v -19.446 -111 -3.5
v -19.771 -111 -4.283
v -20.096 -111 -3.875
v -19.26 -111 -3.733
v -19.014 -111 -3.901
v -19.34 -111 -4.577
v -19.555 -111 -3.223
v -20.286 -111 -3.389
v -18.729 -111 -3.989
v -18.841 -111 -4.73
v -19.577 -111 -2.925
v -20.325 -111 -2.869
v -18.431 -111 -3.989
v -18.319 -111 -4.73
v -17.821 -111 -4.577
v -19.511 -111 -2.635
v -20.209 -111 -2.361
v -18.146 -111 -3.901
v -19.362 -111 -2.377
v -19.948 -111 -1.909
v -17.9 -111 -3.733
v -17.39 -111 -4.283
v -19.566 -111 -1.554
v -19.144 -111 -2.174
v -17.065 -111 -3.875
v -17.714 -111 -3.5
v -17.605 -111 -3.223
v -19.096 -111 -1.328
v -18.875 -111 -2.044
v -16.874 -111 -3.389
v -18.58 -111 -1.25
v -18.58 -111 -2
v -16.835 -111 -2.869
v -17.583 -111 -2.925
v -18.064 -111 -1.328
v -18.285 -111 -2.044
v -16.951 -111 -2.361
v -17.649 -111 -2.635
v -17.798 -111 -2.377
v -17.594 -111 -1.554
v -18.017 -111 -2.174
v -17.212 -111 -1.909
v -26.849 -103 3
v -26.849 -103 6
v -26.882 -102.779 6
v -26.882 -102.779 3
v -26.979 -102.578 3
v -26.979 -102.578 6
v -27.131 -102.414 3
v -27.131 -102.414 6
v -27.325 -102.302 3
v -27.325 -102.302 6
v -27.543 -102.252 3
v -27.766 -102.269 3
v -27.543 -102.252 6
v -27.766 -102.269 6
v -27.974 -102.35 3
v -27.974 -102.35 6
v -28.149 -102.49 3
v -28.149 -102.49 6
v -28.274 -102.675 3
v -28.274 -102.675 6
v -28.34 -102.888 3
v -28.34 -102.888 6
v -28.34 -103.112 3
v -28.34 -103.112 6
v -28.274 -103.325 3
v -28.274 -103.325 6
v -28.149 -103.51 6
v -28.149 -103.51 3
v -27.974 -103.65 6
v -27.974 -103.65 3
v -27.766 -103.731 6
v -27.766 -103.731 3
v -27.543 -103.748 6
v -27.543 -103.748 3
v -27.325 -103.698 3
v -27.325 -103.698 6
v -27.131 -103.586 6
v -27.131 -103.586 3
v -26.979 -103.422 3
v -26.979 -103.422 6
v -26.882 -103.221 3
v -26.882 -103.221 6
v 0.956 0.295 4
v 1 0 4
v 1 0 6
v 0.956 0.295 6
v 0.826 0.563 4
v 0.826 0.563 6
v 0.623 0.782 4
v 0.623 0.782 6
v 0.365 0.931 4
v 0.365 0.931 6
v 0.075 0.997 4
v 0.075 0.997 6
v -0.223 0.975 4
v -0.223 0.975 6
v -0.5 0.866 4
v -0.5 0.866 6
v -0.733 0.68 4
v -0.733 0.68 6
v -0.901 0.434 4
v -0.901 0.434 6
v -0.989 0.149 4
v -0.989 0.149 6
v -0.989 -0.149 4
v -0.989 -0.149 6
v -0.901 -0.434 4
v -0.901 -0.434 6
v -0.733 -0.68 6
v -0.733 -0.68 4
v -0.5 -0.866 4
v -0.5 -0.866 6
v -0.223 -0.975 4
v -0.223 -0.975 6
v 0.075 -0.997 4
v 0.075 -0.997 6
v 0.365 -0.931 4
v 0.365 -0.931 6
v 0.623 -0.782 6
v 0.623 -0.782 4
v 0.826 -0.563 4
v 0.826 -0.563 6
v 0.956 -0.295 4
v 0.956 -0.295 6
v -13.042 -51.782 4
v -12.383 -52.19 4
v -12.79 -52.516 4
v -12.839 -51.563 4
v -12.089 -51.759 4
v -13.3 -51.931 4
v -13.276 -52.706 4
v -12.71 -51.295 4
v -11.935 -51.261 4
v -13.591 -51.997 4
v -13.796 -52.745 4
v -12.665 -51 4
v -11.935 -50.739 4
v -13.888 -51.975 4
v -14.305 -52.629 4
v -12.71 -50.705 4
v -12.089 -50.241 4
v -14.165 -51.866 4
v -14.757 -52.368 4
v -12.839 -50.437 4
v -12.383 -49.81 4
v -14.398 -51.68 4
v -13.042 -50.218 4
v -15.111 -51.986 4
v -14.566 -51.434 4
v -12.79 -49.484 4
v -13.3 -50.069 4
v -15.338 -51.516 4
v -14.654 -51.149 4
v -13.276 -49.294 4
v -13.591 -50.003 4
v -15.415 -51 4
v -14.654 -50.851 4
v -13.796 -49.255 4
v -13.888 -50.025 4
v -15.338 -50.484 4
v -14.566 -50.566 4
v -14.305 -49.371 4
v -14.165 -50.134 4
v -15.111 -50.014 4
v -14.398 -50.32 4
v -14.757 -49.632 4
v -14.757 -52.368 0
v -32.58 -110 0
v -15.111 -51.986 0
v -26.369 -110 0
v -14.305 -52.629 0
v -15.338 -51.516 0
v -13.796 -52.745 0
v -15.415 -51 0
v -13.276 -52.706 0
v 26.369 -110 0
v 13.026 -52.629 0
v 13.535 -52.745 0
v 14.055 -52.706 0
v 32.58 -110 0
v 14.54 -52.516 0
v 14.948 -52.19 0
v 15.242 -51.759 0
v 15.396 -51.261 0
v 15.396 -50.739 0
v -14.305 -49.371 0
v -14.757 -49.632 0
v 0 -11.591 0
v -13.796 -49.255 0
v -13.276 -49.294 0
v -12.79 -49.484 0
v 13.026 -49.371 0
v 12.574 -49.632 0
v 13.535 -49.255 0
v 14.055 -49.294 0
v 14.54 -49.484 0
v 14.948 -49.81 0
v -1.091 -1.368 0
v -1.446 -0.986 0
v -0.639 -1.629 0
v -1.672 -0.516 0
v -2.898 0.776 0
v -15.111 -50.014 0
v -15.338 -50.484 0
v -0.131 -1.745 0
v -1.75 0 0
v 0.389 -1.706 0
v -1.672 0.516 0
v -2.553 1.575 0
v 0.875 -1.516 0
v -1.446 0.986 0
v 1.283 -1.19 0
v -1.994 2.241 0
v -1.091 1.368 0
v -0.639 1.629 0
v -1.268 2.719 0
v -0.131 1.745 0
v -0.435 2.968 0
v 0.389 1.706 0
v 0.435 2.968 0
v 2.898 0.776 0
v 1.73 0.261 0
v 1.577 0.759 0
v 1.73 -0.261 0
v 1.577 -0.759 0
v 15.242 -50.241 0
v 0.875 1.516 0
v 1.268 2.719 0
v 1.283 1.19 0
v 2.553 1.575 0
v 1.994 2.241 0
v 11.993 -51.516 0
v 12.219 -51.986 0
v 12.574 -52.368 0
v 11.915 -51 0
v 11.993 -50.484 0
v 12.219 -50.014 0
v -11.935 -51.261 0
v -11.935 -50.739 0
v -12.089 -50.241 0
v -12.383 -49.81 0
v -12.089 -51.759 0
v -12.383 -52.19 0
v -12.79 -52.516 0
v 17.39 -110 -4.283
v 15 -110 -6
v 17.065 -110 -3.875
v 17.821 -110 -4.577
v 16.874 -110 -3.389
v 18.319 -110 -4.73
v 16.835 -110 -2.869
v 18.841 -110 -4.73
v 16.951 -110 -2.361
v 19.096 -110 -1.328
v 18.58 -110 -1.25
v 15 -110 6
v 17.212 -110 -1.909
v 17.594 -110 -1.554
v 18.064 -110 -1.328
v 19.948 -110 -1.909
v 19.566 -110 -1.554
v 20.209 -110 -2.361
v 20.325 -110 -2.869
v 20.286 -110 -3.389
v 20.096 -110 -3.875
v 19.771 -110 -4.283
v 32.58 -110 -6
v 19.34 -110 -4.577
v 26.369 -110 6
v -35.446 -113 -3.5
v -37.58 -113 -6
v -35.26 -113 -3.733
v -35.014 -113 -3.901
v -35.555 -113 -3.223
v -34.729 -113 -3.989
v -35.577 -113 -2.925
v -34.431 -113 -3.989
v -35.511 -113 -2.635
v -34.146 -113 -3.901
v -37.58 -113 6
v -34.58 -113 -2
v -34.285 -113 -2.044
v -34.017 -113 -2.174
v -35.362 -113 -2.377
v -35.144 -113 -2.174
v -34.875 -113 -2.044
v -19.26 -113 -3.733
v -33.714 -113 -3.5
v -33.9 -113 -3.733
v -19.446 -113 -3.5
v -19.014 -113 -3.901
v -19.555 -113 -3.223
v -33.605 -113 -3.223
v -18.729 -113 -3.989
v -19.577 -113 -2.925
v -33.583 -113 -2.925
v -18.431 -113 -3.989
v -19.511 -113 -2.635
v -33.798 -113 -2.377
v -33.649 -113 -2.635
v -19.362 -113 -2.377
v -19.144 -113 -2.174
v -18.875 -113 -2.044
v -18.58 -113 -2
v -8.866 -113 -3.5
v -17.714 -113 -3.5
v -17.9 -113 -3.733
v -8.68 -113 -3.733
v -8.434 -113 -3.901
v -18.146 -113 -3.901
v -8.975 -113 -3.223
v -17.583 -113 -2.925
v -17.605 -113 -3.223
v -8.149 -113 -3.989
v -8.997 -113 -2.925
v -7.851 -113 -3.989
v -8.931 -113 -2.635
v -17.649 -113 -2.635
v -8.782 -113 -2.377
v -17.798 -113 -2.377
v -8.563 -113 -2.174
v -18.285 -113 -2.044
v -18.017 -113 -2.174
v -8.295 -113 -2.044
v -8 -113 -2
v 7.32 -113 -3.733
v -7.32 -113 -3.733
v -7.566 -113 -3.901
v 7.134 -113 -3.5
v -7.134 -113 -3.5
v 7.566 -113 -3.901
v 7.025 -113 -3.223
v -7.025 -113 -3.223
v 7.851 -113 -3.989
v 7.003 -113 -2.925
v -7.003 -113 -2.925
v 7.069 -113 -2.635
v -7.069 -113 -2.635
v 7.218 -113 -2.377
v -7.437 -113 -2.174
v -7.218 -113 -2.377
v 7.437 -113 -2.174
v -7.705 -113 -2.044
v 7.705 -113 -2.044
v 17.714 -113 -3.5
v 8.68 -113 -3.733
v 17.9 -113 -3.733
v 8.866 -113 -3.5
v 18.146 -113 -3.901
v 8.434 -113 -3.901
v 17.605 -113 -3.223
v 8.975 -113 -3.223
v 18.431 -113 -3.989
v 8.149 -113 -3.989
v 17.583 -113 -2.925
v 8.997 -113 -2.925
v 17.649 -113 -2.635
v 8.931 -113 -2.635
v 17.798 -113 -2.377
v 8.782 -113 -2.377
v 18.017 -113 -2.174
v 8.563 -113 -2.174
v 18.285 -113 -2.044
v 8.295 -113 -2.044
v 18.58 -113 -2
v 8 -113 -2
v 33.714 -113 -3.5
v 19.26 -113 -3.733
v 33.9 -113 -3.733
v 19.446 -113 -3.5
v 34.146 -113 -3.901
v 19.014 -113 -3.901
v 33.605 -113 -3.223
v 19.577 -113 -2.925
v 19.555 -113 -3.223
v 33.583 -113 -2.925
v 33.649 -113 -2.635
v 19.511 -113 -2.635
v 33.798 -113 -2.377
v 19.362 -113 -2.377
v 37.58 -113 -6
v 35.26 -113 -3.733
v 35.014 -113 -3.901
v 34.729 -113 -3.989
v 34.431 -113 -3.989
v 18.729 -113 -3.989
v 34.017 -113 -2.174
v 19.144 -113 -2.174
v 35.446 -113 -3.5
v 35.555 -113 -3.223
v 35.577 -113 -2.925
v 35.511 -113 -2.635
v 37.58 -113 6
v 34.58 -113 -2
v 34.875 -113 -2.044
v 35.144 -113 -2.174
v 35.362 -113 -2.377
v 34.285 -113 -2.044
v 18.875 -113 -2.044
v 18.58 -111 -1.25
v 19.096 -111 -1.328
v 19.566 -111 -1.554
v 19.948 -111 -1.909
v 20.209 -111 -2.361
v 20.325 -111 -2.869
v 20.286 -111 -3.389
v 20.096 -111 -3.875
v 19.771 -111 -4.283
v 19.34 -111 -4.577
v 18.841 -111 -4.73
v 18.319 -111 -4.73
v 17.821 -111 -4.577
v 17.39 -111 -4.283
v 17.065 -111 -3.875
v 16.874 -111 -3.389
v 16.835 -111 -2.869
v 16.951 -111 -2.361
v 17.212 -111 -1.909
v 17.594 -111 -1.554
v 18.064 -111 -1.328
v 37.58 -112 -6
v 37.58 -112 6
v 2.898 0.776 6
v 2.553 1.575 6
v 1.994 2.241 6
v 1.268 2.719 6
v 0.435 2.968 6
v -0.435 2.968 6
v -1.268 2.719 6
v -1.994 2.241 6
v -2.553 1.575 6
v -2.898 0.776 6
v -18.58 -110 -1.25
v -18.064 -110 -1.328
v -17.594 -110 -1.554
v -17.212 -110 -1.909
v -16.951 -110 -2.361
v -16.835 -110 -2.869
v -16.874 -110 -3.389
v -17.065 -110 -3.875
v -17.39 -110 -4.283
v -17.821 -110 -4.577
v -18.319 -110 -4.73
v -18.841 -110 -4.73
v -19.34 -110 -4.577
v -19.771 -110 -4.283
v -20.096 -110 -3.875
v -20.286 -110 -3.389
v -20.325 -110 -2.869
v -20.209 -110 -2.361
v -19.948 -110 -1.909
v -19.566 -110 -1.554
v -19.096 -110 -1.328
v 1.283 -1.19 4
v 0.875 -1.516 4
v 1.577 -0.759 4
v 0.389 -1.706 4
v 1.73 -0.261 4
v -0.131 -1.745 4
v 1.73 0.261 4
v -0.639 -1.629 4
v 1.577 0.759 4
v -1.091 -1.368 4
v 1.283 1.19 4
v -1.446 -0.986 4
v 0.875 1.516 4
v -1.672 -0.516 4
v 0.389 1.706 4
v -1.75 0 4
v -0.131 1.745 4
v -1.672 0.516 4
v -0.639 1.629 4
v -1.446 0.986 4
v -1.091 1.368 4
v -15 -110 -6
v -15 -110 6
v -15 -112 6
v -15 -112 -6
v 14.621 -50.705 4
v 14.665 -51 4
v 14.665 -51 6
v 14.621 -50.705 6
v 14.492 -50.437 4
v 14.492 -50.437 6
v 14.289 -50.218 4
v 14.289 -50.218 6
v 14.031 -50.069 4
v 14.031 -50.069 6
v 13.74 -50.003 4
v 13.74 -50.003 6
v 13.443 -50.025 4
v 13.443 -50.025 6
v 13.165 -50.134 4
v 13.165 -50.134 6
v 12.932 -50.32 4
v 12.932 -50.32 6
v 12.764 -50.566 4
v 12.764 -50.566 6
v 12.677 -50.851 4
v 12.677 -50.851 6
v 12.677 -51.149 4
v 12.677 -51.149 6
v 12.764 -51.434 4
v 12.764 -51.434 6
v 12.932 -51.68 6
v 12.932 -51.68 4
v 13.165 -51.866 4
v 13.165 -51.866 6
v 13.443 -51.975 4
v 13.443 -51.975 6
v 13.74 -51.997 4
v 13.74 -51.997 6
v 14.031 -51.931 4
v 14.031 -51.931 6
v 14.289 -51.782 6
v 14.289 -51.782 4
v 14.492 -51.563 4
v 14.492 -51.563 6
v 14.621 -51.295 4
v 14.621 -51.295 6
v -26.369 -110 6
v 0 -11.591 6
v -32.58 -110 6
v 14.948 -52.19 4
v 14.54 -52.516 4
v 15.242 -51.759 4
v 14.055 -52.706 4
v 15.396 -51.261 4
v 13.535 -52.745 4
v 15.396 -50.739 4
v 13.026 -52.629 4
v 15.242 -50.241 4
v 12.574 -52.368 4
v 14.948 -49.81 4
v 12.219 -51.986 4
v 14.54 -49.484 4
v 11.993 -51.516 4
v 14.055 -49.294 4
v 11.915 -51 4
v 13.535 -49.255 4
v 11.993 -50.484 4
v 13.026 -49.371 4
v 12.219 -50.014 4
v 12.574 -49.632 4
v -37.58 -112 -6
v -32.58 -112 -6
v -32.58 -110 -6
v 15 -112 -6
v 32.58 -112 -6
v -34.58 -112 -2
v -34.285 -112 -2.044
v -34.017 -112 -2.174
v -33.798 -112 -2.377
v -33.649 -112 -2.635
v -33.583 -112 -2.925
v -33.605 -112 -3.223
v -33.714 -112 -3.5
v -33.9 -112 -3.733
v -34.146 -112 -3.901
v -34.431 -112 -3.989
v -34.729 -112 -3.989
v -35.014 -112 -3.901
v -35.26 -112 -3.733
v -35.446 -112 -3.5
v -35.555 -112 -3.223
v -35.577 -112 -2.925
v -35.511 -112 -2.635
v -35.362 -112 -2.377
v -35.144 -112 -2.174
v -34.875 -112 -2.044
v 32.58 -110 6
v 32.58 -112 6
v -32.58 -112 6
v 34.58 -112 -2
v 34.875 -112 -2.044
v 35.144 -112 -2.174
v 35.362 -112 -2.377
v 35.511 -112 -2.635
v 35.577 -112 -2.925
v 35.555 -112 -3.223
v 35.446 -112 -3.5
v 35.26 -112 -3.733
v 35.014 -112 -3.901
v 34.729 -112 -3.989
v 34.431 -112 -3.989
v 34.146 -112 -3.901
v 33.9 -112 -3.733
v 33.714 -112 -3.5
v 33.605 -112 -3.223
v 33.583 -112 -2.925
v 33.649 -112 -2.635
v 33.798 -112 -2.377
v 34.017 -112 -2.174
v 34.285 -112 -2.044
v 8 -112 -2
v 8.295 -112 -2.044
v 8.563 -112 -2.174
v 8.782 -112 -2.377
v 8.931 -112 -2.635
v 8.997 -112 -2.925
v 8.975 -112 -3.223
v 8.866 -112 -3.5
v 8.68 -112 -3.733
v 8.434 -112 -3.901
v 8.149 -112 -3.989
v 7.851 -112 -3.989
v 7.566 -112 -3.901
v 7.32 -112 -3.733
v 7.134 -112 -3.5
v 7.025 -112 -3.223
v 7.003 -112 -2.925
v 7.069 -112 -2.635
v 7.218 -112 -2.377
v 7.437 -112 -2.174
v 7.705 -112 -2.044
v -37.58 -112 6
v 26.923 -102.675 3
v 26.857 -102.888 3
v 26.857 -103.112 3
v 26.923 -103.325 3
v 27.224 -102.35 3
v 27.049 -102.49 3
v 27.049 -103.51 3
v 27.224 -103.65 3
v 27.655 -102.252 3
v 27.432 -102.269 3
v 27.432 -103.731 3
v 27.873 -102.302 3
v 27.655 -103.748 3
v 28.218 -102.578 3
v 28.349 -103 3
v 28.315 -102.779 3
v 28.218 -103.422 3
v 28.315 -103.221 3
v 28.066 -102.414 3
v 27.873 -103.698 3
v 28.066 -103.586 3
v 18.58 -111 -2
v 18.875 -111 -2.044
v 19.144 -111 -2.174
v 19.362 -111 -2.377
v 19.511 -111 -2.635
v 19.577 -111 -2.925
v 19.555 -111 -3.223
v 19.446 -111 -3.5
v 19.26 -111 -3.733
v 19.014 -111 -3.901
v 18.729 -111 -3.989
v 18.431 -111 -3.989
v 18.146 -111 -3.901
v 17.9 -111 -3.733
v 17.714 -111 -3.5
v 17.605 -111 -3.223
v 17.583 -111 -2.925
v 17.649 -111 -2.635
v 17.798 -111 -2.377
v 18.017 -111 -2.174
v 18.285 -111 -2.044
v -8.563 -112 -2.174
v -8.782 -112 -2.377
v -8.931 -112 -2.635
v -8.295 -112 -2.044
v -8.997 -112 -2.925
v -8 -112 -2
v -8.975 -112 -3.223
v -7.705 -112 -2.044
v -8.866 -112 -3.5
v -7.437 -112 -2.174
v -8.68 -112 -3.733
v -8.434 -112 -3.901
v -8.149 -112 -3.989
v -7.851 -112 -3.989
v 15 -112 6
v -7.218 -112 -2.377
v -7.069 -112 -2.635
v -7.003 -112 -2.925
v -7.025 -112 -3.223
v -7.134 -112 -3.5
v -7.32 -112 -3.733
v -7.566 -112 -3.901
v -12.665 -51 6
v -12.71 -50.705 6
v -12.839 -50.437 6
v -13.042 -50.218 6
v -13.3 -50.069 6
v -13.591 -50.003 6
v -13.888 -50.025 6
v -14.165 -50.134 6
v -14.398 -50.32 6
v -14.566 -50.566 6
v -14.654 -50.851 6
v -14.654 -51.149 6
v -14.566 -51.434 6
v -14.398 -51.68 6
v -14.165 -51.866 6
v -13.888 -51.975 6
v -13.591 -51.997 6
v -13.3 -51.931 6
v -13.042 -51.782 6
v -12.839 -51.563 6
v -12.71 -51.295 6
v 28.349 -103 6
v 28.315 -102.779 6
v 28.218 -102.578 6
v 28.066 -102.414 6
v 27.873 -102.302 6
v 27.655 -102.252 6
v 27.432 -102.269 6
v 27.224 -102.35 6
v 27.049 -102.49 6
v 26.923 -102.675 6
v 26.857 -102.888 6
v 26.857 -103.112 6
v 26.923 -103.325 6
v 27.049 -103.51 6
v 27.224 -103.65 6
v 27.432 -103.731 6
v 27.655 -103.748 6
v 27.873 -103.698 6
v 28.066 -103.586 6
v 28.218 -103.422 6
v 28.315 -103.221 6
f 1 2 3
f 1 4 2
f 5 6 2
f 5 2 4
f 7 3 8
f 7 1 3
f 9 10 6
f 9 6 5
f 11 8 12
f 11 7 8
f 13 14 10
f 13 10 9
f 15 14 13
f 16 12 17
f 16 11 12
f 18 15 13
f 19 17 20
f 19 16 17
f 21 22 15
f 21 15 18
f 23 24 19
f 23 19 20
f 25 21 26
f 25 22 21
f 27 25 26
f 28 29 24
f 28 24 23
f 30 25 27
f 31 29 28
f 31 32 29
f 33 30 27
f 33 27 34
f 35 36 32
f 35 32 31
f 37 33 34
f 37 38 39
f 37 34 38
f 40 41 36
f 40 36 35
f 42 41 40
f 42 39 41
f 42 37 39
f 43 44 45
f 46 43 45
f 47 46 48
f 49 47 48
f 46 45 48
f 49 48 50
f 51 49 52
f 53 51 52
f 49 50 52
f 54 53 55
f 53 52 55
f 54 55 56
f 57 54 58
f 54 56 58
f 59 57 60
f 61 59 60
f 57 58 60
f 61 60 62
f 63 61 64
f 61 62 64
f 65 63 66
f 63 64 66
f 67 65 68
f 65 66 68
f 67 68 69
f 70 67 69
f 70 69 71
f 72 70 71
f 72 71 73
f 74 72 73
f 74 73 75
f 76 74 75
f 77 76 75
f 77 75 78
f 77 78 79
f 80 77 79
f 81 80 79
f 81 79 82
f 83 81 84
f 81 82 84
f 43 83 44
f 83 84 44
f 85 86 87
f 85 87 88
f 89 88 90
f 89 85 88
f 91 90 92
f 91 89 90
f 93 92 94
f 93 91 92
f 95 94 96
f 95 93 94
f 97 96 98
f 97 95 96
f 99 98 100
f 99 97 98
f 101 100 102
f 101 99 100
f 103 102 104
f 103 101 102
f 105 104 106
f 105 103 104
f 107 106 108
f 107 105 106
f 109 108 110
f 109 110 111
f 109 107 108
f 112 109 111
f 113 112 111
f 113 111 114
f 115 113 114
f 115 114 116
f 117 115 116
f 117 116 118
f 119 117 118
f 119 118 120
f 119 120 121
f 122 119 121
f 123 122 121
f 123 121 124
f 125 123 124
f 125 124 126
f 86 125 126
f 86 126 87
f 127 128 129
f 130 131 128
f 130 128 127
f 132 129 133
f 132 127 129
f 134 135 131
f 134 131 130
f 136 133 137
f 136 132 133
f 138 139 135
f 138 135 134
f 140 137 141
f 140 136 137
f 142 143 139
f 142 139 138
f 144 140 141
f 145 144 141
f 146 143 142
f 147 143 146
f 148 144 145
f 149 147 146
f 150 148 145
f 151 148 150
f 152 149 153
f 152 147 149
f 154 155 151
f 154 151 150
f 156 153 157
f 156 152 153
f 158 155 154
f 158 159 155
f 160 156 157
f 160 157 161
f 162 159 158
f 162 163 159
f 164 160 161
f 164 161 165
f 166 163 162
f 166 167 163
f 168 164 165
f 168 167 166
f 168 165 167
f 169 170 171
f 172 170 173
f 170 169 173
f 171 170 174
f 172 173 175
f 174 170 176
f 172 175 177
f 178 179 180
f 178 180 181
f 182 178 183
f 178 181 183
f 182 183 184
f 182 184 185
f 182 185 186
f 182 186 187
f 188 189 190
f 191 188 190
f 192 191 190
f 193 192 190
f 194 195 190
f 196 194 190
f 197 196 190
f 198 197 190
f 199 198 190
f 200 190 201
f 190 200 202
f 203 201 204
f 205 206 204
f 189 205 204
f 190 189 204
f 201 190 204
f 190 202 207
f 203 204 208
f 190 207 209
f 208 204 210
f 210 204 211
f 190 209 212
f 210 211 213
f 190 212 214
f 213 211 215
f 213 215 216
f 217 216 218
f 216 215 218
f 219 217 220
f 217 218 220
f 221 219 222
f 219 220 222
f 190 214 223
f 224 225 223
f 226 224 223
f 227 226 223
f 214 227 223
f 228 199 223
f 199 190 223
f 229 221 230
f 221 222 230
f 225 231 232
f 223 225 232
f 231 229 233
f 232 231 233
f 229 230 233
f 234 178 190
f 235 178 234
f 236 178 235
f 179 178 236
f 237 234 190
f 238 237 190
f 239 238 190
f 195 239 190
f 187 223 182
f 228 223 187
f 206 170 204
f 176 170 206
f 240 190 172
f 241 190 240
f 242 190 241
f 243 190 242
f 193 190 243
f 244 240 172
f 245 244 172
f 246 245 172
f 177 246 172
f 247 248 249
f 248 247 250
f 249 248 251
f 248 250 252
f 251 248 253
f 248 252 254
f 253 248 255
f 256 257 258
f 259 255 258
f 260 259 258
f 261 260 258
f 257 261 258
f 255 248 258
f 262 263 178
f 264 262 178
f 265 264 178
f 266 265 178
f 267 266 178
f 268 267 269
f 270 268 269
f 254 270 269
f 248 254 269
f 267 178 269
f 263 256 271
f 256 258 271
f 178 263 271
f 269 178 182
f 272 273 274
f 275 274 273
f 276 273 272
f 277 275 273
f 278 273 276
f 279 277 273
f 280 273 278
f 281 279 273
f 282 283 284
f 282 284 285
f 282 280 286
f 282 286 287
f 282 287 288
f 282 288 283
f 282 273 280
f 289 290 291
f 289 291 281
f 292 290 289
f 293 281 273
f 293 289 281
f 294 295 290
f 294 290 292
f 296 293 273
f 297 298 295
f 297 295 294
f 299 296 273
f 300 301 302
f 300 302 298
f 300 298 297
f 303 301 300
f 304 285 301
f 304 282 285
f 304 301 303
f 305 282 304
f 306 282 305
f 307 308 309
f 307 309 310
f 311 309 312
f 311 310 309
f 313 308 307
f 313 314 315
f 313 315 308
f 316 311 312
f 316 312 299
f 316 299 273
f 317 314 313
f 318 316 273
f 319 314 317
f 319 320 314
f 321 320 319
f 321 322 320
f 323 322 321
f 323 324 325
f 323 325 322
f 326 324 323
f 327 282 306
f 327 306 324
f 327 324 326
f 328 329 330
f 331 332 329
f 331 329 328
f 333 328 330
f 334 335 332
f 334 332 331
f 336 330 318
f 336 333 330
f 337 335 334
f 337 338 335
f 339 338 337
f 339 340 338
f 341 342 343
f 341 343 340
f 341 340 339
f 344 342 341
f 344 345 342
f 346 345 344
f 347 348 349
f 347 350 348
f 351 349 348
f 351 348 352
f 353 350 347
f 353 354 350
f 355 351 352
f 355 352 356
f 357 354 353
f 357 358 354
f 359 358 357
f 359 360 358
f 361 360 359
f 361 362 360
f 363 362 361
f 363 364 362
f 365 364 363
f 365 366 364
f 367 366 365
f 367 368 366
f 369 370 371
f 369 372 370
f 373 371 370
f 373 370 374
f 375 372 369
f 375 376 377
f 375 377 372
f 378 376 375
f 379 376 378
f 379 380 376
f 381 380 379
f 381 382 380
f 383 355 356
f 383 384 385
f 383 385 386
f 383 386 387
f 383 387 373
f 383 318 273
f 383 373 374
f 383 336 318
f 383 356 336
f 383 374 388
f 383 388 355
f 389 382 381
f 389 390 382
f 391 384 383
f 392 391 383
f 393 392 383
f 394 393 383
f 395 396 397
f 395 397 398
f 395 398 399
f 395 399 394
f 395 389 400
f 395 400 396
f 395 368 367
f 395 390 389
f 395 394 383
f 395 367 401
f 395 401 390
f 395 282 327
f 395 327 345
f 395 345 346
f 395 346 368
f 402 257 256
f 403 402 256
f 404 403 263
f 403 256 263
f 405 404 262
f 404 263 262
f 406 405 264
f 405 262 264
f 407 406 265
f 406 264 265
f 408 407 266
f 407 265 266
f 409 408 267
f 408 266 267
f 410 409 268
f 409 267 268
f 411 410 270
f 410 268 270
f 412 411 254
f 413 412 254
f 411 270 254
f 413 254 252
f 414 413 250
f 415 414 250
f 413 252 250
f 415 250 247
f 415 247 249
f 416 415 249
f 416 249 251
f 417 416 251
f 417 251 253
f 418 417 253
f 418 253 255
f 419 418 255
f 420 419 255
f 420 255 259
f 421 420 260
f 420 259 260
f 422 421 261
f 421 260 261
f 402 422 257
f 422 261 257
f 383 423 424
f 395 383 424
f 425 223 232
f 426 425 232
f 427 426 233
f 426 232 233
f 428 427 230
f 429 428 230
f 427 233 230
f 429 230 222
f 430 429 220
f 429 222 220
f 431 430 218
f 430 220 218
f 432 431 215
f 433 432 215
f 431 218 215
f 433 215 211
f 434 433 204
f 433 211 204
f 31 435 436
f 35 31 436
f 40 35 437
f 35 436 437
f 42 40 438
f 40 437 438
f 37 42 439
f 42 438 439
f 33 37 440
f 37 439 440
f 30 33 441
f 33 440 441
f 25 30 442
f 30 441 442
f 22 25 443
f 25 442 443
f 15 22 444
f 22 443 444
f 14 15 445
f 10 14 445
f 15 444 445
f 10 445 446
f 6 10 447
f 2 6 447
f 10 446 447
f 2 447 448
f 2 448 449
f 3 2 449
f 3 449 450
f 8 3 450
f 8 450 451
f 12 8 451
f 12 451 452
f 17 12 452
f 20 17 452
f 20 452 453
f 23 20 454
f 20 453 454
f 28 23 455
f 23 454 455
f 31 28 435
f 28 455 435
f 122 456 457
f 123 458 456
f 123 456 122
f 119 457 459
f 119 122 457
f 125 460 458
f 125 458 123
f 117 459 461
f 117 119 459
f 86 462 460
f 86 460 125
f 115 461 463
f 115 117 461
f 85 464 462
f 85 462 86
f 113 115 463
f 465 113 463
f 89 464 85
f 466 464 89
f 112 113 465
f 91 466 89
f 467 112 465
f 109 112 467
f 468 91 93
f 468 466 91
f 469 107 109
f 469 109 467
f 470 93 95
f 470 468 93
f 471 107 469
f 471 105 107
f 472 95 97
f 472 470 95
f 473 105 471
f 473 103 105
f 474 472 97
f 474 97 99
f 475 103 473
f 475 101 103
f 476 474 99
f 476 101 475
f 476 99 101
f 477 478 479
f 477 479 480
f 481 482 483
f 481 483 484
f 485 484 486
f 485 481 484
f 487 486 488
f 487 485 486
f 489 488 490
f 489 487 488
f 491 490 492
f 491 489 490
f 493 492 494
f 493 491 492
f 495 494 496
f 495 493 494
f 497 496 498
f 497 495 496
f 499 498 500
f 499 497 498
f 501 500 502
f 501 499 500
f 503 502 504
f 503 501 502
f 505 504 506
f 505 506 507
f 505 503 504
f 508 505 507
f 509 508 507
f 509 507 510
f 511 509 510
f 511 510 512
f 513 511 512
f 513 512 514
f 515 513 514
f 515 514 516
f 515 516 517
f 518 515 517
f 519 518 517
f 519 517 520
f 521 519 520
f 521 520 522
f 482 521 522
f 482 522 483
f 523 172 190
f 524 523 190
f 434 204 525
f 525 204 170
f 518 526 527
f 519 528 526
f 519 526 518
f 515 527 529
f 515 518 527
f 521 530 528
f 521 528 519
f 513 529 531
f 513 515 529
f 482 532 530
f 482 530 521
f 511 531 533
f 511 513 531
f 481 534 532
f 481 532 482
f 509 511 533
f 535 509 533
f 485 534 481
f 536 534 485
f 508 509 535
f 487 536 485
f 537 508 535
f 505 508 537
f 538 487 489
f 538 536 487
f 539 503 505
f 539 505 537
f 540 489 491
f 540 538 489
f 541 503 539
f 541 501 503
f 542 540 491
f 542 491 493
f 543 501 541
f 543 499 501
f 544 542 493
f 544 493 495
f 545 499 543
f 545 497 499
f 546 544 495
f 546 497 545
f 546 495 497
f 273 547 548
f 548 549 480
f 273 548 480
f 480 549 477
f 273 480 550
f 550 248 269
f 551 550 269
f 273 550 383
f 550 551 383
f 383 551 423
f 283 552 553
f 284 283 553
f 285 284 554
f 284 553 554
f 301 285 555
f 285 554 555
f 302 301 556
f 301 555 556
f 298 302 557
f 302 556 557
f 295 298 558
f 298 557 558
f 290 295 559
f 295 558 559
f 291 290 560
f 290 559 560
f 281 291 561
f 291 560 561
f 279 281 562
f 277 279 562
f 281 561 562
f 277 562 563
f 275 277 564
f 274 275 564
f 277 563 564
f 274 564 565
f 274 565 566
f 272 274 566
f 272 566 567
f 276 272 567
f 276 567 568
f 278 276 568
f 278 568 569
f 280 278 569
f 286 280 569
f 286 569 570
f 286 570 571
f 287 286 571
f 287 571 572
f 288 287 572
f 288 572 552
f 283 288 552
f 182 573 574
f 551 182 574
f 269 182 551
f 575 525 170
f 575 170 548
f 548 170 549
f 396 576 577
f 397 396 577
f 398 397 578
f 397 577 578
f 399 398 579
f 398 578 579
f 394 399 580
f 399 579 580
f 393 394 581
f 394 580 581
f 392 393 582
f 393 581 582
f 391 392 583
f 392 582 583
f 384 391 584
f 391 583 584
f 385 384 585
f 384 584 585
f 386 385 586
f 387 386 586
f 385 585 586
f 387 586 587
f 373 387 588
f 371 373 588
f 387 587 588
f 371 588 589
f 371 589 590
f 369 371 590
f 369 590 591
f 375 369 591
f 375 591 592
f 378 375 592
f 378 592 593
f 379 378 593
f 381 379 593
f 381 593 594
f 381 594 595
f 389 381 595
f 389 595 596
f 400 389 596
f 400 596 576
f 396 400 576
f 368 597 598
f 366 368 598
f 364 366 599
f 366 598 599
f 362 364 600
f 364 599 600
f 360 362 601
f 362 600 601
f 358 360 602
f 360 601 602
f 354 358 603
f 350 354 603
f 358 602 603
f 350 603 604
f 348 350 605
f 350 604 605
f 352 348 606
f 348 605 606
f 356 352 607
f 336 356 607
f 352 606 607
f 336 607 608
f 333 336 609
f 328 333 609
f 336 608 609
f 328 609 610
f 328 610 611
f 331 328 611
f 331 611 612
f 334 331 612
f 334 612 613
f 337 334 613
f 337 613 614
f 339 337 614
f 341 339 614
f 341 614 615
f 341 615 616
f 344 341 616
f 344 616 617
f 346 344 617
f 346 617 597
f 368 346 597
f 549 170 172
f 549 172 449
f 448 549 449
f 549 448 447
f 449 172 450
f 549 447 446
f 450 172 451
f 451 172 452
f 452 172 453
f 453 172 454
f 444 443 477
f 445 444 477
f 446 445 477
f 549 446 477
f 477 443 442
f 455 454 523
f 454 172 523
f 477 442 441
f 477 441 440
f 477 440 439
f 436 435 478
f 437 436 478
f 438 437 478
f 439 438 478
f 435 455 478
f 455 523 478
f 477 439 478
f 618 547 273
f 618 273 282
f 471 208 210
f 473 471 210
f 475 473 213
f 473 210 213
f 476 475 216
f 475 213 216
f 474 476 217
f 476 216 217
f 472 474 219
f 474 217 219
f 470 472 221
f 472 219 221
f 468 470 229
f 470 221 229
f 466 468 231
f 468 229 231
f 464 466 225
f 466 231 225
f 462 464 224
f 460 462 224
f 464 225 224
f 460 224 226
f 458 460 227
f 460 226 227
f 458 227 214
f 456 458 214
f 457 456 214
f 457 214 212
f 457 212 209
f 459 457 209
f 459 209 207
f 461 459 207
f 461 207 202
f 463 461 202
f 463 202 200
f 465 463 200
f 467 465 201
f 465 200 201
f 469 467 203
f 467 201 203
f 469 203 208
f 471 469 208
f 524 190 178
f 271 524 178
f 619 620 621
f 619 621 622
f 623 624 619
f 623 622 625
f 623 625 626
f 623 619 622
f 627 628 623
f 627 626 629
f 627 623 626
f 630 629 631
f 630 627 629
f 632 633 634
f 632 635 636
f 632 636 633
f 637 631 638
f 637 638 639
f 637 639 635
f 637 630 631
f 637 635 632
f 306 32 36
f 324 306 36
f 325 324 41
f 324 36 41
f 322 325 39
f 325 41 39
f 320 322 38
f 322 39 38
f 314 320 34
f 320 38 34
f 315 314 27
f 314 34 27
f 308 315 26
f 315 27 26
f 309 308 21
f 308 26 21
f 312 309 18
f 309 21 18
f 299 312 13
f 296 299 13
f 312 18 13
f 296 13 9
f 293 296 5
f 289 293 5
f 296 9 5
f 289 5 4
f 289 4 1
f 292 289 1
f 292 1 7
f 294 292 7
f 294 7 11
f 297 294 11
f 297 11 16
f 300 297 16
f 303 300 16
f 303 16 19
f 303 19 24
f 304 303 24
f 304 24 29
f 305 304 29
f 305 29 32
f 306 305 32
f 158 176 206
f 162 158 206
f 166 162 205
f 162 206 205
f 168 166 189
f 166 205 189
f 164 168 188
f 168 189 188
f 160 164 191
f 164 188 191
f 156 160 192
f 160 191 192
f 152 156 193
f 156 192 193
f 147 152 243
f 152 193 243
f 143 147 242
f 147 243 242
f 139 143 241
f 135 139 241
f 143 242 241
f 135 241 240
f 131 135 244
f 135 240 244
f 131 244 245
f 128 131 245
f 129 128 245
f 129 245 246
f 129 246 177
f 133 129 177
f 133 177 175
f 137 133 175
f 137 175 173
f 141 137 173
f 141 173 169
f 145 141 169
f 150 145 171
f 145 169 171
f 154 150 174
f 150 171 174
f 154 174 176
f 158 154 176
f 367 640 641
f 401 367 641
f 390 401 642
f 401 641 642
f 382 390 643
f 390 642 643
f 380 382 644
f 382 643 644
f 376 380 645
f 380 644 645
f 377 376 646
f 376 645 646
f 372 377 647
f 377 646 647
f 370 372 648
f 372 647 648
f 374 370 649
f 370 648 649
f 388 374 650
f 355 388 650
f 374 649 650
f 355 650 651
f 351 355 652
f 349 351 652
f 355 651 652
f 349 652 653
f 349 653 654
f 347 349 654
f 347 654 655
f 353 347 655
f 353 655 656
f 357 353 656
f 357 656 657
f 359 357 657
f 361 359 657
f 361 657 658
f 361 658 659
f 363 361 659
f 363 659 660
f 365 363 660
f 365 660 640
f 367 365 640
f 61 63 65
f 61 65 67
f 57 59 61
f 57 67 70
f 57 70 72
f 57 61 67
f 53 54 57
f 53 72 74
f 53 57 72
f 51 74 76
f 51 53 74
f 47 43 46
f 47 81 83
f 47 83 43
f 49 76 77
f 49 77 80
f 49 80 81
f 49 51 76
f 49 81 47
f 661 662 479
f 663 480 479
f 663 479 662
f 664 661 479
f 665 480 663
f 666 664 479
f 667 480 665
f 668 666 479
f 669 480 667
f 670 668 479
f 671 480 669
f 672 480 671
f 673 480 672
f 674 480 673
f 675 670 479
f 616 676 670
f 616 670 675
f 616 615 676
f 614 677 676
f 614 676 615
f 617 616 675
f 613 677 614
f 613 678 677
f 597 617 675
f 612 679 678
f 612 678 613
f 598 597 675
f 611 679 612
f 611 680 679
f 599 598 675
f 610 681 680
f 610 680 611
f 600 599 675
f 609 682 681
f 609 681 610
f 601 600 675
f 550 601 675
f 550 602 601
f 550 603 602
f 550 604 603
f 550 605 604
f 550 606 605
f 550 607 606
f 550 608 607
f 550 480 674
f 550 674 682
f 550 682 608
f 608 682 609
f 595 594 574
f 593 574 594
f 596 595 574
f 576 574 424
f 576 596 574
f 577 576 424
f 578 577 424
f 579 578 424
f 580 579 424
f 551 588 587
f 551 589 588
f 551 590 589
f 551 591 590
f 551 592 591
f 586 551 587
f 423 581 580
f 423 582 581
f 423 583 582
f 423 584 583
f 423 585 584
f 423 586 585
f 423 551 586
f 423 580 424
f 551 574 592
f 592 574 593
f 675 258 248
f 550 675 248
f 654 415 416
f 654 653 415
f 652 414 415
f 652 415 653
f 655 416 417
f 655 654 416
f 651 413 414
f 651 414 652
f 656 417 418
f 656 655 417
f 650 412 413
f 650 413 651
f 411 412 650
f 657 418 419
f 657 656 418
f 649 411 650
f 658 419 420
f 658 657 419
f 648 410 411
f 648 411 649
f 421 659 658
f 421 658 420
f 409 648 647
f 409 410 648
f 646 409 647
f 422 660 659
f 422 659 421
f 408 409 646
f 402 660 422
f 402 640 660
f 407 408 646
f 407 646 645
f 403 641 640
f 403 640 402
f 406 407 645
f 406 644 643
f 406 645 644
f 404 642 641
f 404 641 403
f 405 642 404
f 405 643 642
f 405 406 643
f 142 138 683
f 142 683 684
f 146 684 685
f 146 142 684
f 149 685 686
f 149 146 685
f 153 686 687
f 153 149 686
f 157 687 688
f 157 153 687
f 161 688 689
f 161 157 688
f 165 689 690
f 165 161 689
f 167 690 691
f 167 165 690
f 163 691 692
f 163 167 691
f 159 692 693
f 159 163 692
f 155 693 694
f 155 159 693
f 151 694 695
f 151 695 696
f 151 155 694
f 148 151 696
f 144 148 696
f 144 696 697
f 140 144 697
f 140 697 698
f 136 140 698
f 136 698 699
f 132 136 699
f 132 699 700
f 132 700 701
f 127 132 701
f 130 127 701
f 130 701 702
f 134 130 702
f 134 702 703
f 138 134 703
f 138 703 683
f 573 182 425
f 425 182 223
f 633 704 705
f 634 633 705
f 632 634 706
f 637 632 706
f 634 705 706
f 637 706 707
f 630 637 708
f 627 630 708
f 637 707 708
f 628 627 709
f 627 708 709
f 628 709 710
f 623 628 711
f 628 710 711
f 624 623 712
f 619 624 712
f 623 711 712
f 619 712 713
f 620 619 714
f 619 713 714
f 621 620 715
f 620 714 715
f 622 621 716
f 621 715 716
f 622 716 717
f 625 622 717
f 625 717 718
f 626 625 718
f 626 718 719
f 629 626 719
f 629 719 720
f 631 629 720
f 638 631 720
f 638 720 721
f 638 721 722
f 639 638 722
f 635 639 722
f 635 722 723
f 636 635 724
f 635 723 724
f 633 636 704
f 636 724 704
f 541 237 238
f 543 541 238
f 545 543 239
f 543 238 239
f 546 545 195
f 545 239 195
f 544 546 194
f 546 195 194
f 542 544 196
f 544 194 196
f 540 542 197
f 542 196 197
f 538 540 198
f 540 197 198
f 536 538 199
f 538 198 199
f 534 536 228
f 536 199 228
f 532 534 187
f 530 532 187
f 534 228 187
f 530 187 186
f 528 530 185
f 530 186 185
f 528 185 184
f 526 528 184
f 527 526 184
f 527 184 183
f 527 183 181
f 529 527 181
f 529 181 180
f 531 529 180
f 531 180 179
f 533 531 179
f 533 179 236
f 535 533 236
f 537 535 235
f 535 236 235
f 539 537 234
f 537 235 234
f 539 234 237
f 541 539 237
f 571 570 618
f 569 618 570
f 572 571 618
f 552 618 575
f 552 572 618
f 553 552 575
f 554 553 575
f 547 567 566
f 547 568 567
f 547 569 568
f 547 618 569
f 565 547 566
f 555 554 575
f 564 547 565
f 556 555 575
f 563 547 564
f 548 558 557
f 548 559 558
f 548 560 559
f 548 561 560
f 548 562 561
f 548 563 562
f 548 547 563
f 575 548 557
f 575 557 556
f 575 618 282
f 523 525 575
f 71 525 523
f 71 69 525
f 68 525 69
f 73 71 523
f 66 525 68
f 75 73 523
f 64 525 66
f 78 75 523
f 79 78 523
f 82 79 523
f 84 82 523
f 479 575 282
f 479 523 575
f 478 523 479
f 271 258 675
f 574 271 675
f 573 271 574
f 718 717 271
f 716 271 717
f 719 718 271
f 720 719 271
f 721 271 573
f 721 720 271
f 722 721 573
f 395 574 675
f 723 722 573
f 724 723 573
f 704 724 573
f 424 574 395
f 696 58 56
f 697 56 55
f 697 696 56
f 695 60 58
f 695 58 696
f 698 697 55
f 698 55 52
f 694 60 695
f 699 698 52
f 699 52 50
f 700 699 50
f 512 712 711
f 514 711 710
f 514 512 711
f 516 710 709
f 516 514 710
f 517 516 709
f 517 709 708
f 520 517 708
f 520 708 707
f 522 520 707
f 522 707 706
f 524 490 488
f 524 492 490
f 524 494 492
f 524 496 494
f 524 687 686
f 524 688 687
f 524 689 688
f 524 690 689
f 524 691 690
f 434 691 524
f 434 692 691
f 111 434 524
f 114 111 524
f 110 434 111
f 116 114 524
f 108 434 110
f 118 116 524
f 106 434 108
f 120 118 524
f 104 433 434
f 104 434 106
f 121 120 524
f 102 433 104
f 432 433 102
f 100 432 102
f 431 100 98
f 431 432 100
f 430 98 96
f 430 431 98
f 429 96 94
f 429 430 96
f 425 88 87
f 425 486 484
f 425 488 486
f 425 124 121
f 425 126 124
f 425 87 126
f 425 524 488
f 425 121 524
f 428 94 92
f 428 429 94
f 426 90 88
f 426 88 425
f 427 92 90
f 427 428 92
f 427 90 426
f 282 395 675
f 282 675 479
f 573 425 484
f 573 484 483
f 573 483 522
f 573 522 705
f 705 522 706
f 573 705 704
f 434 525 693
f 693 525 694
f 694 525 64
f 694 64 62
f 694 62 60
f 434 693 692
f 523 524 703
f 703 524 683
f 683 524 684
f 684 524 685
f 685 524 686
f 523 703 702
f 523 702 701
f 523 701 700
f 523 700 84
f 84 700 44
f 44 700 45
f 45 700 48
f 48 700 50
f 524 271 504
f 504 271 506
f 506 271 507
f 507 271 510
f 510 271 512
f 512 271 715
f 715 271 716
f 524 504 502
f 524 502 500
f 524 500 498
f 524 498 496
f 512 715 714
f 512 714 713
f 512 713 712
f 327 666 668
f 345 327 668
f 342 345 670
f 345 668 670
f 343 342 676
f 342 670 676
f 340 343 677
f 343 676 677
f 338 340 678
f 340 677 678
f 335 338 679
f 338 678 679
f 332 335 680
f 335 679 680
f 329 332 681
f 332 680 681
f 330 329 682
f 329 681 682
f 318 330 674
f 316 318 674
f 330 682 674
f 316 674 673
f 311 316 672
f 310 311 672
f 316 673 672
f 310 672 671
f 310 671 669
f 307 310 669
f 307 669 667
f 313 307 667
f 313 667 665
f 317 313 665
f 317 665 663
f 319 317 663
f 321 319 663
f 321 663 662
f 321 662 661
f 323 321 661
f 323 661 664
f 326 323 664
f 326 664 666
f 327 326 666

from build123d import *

# Parameters (mm, degrees)
SKETCH_1_R          = 1
EXTRUDE_1_DEPTH     = 6
SKETCH_2_R          = 1.75
CUT_EXTRUDE_1_DEPTH = 4
SKETCH_3_W          = 75.160479418
SKETCH_3_H          = 12
EXTRUDE_2_DEPTH     = 3
SKETCH_4_R          = 0.75
CUT_EXTRUDE_2_DEPTH = 3
SKETCH_5_W          = 5
SKETCH_5_H          = 12
SKETCH_5_W_2        = 30
CUT_EXTRUDE_3_DEPTH = 2
SKETCH_6_R          = 1
CUT_EXTRUDE_4_DEPTH = 120.23621269
SKETCH_6_3_R        = 1
SKETCH_6_3_R_2      = 1.75
CUT_EXTRUDE_5_DEPTH = 1


with BuildPart() as part:
    # 草图1 → 凸台-拉伸1 (new body)
    with BuildSketch(Plane.XY):
        with BuildLine():
            Line((0, -11.591109915), (26.368582626, -110))
            Line((26.368582626, -110), (32.580239709, -110))
            Line((32.580239709, -110), (2.897777479, 0.776457135))
            ThreePointArc((2.897777479, 0.776457135), (0, 3), (-2.897777479, 0.776457135))
            Line((-2.897777479, 0.776457135), (-32.580239709, -110))
            Line((-32.580239709, -110), (-26.368582626, -110))
            Line((-26.368582626, -110), (0, -11.591109915))
        make_face()
        with Locations((13.665408814, -51)):
            Circle(SKETCH_1_R, mode=Mode.SUBTRACT)
        Circle(SKETCH_1_R, mode=Mode.SUBTRACT)
        with Locations((-13.665408814, -51)):
            Circle(SKETCH_1_R, mode=Mode.SUBTRACT)
    extrude(amount=EXTRUDE_1_DEPTH)

    # 草图2 → 切除-拉伸1 (cut)
    with BuildSketch(Plane(origin=(0, 0, 0), x_dir=(-1, 0, 0), z_dir=(0, 0, -1))):
        Circle(SKETCH_2_R)
        with Locations((13.665408814, -51)):
            Circle(SKETCH_2_R)
        with Locations((-13.665408814, -51)):
            Circle(SKETCH_2_R)
    extrude(amount=-CUT_EXTRUDE_1_DEPTH, mode=Mode.SUBTRACT)

    # 草图3 → 凸台-拉伸2 (add)
    with BuildSketch(Plane.XZ.offset(110)):
        Rectangle(SKETCH_3_W, SKETCH_3_H)
    extrude(amount=EXTRUDE_2_DEPTH)

    # 草图4 → 切除-拉伸2 (cut)
    with BuildSketch(Plane.XY.offset(6)):
        with Locations((-27.59876682, -103)):
            Circle(SKETCH_4_R)
        with Locations((27.59876682, -103)):
            Circle(SKETCH_4_R)
    extrude(amount=-CUT_EXTRUDE_2_DEPTH, mode=Mode.SUBTRACT)

    # 草图5 → 切除-拉伸3 (cut)
    with BuildSketch(Plane(origin=(0, -110, 0), x_dir=(1, 0, 0), z_dir=(0, 1, 0))):
        with Locations((-35.080239709, 0)):
            Rectangle(SKETCH_5_W, SKETCH_5_H)
        with Locations((35.080239709, 0)):
            Rectangle(SKETCH_5_W, SKETCH_5_H)
        Rectangle(SKETCH_5_W_2, SKETCH_5_H)
    extrude(amount=-CUT_EXTRUDE_3_DEPTH, mode=Mode.SUBTRACT)

    # 草图6 → 切除-拉伸4 (cut, through all)
    with BuildSketch(Plane(origin=(0, -110, 0), x_dir=(1, 0, 0), z_dir=(0, 1, 0))):
        with Locations(Location((-8, 3, 0), (0, 0, 270))):
            Circle(SKETCH_6_R)
        with Locations(Location((-34.580239709, 3, 0), (0, 0, 270))):
            Circle(SKETCH_6_R)
        with Locations(Location((-18.580239709, 3, 0), (0, 0, 270))):
            Circle(SKETCH_6_R)
        with Locations(Location((8, 3, 0), (0, 0, 270))):
            Circle(SKETCH_6_R)
        with Locations(Location((18.580239709, 3, 0), (0, 0, 270))):
            Circle(SKETCH_6_R)
        with Locations(Location((34.580239709, 3, 0), (0, 0, 270))):
            Circle(SKETCH_6_R)
    extrude(amount=-CUT_EXTRUDE_4_DEPTH, mode=Mode.SUBTRACT)

    # 草图6<3> → 切除-拉伸5 (cut)
    # profile 1 of 6: a face of its own
    with BuildSketch(Plane(origin=(0, -110, 0), x_dir=(1, 0, 0), z_dir=(0, 1, 0))):
        with Locations(Location((-34.580239709, 3, 0), (0, 0, 270))):
            Circle(SKETCH_6_3_R)
    # profile 2 of 6: a face of its own
    with BuildSketch(Plane(origin=(0, -110, 0), x_dir=(1, 0, 0), z_dir=(0, 1, 0))):
        with Locations(Location((-8, 3, 0), (0, 0, 270))):
            Circle(SKETCH_6_3_R)
    # profile 3 of 6: a face of its own
    with BuildSketch(Plane(origin=(0, -110, 0), x_dir=(1, 0, 0), z_dir=(0, 1, 0))):
        with Locations(Location((8, 3, 0), (0, 0, 270))):
            Circle(SKETCH_6_3_R)
    # profile 4 of 6: a face of its own
    with BuildSketch(Plane(origin=(0, -110, 0), x_dir=(1, 0, 0), z_dir=(0, 1, 0))):
        with Locations(Location((34.580239709, 3, 0), (0, 0, 270))):
            Circle(SKETCH_6_3_R)
    # profile 5 of 6: a face of its own
    with BuildSketch(Plane(origin=(0, -110, 0), x_dir=(1, 0, 0), z_dir=(0, 1, 0))):
        with Locations(Location((18.580239709, 3, 0), (0, 0, 270))):
            Circle(SKETCH_6_3_R_2)
        with Locations(Location((18.580239709, 3, 0), (0, 0, 270))):
            Circle(SKETCH_6_3_R, mode=Mode.SUBTRACT)
    # profile 6 of 6: a face of its own
    with BuildSketch(Plane(origin=(0, -110, 0), x_dir=(1, 0, 0), z_dir=(0, 1, 0))):
        with Locations(Location((-18.580239709, 3, 0), (0, 0, 270))):
            Circle(SKETCH_6_3_R_2)
        with Locations(Location((-18.580239709, 3, 0), (0, 0, 270))):
            Circle(SKETCH_6_3_R, mode=Mode.SUBTRACT)
    extrude(amount=-CUT_EXTRUDE_5_DEPTH, mode=Mode.SUBTRACT)


solid = part.part
